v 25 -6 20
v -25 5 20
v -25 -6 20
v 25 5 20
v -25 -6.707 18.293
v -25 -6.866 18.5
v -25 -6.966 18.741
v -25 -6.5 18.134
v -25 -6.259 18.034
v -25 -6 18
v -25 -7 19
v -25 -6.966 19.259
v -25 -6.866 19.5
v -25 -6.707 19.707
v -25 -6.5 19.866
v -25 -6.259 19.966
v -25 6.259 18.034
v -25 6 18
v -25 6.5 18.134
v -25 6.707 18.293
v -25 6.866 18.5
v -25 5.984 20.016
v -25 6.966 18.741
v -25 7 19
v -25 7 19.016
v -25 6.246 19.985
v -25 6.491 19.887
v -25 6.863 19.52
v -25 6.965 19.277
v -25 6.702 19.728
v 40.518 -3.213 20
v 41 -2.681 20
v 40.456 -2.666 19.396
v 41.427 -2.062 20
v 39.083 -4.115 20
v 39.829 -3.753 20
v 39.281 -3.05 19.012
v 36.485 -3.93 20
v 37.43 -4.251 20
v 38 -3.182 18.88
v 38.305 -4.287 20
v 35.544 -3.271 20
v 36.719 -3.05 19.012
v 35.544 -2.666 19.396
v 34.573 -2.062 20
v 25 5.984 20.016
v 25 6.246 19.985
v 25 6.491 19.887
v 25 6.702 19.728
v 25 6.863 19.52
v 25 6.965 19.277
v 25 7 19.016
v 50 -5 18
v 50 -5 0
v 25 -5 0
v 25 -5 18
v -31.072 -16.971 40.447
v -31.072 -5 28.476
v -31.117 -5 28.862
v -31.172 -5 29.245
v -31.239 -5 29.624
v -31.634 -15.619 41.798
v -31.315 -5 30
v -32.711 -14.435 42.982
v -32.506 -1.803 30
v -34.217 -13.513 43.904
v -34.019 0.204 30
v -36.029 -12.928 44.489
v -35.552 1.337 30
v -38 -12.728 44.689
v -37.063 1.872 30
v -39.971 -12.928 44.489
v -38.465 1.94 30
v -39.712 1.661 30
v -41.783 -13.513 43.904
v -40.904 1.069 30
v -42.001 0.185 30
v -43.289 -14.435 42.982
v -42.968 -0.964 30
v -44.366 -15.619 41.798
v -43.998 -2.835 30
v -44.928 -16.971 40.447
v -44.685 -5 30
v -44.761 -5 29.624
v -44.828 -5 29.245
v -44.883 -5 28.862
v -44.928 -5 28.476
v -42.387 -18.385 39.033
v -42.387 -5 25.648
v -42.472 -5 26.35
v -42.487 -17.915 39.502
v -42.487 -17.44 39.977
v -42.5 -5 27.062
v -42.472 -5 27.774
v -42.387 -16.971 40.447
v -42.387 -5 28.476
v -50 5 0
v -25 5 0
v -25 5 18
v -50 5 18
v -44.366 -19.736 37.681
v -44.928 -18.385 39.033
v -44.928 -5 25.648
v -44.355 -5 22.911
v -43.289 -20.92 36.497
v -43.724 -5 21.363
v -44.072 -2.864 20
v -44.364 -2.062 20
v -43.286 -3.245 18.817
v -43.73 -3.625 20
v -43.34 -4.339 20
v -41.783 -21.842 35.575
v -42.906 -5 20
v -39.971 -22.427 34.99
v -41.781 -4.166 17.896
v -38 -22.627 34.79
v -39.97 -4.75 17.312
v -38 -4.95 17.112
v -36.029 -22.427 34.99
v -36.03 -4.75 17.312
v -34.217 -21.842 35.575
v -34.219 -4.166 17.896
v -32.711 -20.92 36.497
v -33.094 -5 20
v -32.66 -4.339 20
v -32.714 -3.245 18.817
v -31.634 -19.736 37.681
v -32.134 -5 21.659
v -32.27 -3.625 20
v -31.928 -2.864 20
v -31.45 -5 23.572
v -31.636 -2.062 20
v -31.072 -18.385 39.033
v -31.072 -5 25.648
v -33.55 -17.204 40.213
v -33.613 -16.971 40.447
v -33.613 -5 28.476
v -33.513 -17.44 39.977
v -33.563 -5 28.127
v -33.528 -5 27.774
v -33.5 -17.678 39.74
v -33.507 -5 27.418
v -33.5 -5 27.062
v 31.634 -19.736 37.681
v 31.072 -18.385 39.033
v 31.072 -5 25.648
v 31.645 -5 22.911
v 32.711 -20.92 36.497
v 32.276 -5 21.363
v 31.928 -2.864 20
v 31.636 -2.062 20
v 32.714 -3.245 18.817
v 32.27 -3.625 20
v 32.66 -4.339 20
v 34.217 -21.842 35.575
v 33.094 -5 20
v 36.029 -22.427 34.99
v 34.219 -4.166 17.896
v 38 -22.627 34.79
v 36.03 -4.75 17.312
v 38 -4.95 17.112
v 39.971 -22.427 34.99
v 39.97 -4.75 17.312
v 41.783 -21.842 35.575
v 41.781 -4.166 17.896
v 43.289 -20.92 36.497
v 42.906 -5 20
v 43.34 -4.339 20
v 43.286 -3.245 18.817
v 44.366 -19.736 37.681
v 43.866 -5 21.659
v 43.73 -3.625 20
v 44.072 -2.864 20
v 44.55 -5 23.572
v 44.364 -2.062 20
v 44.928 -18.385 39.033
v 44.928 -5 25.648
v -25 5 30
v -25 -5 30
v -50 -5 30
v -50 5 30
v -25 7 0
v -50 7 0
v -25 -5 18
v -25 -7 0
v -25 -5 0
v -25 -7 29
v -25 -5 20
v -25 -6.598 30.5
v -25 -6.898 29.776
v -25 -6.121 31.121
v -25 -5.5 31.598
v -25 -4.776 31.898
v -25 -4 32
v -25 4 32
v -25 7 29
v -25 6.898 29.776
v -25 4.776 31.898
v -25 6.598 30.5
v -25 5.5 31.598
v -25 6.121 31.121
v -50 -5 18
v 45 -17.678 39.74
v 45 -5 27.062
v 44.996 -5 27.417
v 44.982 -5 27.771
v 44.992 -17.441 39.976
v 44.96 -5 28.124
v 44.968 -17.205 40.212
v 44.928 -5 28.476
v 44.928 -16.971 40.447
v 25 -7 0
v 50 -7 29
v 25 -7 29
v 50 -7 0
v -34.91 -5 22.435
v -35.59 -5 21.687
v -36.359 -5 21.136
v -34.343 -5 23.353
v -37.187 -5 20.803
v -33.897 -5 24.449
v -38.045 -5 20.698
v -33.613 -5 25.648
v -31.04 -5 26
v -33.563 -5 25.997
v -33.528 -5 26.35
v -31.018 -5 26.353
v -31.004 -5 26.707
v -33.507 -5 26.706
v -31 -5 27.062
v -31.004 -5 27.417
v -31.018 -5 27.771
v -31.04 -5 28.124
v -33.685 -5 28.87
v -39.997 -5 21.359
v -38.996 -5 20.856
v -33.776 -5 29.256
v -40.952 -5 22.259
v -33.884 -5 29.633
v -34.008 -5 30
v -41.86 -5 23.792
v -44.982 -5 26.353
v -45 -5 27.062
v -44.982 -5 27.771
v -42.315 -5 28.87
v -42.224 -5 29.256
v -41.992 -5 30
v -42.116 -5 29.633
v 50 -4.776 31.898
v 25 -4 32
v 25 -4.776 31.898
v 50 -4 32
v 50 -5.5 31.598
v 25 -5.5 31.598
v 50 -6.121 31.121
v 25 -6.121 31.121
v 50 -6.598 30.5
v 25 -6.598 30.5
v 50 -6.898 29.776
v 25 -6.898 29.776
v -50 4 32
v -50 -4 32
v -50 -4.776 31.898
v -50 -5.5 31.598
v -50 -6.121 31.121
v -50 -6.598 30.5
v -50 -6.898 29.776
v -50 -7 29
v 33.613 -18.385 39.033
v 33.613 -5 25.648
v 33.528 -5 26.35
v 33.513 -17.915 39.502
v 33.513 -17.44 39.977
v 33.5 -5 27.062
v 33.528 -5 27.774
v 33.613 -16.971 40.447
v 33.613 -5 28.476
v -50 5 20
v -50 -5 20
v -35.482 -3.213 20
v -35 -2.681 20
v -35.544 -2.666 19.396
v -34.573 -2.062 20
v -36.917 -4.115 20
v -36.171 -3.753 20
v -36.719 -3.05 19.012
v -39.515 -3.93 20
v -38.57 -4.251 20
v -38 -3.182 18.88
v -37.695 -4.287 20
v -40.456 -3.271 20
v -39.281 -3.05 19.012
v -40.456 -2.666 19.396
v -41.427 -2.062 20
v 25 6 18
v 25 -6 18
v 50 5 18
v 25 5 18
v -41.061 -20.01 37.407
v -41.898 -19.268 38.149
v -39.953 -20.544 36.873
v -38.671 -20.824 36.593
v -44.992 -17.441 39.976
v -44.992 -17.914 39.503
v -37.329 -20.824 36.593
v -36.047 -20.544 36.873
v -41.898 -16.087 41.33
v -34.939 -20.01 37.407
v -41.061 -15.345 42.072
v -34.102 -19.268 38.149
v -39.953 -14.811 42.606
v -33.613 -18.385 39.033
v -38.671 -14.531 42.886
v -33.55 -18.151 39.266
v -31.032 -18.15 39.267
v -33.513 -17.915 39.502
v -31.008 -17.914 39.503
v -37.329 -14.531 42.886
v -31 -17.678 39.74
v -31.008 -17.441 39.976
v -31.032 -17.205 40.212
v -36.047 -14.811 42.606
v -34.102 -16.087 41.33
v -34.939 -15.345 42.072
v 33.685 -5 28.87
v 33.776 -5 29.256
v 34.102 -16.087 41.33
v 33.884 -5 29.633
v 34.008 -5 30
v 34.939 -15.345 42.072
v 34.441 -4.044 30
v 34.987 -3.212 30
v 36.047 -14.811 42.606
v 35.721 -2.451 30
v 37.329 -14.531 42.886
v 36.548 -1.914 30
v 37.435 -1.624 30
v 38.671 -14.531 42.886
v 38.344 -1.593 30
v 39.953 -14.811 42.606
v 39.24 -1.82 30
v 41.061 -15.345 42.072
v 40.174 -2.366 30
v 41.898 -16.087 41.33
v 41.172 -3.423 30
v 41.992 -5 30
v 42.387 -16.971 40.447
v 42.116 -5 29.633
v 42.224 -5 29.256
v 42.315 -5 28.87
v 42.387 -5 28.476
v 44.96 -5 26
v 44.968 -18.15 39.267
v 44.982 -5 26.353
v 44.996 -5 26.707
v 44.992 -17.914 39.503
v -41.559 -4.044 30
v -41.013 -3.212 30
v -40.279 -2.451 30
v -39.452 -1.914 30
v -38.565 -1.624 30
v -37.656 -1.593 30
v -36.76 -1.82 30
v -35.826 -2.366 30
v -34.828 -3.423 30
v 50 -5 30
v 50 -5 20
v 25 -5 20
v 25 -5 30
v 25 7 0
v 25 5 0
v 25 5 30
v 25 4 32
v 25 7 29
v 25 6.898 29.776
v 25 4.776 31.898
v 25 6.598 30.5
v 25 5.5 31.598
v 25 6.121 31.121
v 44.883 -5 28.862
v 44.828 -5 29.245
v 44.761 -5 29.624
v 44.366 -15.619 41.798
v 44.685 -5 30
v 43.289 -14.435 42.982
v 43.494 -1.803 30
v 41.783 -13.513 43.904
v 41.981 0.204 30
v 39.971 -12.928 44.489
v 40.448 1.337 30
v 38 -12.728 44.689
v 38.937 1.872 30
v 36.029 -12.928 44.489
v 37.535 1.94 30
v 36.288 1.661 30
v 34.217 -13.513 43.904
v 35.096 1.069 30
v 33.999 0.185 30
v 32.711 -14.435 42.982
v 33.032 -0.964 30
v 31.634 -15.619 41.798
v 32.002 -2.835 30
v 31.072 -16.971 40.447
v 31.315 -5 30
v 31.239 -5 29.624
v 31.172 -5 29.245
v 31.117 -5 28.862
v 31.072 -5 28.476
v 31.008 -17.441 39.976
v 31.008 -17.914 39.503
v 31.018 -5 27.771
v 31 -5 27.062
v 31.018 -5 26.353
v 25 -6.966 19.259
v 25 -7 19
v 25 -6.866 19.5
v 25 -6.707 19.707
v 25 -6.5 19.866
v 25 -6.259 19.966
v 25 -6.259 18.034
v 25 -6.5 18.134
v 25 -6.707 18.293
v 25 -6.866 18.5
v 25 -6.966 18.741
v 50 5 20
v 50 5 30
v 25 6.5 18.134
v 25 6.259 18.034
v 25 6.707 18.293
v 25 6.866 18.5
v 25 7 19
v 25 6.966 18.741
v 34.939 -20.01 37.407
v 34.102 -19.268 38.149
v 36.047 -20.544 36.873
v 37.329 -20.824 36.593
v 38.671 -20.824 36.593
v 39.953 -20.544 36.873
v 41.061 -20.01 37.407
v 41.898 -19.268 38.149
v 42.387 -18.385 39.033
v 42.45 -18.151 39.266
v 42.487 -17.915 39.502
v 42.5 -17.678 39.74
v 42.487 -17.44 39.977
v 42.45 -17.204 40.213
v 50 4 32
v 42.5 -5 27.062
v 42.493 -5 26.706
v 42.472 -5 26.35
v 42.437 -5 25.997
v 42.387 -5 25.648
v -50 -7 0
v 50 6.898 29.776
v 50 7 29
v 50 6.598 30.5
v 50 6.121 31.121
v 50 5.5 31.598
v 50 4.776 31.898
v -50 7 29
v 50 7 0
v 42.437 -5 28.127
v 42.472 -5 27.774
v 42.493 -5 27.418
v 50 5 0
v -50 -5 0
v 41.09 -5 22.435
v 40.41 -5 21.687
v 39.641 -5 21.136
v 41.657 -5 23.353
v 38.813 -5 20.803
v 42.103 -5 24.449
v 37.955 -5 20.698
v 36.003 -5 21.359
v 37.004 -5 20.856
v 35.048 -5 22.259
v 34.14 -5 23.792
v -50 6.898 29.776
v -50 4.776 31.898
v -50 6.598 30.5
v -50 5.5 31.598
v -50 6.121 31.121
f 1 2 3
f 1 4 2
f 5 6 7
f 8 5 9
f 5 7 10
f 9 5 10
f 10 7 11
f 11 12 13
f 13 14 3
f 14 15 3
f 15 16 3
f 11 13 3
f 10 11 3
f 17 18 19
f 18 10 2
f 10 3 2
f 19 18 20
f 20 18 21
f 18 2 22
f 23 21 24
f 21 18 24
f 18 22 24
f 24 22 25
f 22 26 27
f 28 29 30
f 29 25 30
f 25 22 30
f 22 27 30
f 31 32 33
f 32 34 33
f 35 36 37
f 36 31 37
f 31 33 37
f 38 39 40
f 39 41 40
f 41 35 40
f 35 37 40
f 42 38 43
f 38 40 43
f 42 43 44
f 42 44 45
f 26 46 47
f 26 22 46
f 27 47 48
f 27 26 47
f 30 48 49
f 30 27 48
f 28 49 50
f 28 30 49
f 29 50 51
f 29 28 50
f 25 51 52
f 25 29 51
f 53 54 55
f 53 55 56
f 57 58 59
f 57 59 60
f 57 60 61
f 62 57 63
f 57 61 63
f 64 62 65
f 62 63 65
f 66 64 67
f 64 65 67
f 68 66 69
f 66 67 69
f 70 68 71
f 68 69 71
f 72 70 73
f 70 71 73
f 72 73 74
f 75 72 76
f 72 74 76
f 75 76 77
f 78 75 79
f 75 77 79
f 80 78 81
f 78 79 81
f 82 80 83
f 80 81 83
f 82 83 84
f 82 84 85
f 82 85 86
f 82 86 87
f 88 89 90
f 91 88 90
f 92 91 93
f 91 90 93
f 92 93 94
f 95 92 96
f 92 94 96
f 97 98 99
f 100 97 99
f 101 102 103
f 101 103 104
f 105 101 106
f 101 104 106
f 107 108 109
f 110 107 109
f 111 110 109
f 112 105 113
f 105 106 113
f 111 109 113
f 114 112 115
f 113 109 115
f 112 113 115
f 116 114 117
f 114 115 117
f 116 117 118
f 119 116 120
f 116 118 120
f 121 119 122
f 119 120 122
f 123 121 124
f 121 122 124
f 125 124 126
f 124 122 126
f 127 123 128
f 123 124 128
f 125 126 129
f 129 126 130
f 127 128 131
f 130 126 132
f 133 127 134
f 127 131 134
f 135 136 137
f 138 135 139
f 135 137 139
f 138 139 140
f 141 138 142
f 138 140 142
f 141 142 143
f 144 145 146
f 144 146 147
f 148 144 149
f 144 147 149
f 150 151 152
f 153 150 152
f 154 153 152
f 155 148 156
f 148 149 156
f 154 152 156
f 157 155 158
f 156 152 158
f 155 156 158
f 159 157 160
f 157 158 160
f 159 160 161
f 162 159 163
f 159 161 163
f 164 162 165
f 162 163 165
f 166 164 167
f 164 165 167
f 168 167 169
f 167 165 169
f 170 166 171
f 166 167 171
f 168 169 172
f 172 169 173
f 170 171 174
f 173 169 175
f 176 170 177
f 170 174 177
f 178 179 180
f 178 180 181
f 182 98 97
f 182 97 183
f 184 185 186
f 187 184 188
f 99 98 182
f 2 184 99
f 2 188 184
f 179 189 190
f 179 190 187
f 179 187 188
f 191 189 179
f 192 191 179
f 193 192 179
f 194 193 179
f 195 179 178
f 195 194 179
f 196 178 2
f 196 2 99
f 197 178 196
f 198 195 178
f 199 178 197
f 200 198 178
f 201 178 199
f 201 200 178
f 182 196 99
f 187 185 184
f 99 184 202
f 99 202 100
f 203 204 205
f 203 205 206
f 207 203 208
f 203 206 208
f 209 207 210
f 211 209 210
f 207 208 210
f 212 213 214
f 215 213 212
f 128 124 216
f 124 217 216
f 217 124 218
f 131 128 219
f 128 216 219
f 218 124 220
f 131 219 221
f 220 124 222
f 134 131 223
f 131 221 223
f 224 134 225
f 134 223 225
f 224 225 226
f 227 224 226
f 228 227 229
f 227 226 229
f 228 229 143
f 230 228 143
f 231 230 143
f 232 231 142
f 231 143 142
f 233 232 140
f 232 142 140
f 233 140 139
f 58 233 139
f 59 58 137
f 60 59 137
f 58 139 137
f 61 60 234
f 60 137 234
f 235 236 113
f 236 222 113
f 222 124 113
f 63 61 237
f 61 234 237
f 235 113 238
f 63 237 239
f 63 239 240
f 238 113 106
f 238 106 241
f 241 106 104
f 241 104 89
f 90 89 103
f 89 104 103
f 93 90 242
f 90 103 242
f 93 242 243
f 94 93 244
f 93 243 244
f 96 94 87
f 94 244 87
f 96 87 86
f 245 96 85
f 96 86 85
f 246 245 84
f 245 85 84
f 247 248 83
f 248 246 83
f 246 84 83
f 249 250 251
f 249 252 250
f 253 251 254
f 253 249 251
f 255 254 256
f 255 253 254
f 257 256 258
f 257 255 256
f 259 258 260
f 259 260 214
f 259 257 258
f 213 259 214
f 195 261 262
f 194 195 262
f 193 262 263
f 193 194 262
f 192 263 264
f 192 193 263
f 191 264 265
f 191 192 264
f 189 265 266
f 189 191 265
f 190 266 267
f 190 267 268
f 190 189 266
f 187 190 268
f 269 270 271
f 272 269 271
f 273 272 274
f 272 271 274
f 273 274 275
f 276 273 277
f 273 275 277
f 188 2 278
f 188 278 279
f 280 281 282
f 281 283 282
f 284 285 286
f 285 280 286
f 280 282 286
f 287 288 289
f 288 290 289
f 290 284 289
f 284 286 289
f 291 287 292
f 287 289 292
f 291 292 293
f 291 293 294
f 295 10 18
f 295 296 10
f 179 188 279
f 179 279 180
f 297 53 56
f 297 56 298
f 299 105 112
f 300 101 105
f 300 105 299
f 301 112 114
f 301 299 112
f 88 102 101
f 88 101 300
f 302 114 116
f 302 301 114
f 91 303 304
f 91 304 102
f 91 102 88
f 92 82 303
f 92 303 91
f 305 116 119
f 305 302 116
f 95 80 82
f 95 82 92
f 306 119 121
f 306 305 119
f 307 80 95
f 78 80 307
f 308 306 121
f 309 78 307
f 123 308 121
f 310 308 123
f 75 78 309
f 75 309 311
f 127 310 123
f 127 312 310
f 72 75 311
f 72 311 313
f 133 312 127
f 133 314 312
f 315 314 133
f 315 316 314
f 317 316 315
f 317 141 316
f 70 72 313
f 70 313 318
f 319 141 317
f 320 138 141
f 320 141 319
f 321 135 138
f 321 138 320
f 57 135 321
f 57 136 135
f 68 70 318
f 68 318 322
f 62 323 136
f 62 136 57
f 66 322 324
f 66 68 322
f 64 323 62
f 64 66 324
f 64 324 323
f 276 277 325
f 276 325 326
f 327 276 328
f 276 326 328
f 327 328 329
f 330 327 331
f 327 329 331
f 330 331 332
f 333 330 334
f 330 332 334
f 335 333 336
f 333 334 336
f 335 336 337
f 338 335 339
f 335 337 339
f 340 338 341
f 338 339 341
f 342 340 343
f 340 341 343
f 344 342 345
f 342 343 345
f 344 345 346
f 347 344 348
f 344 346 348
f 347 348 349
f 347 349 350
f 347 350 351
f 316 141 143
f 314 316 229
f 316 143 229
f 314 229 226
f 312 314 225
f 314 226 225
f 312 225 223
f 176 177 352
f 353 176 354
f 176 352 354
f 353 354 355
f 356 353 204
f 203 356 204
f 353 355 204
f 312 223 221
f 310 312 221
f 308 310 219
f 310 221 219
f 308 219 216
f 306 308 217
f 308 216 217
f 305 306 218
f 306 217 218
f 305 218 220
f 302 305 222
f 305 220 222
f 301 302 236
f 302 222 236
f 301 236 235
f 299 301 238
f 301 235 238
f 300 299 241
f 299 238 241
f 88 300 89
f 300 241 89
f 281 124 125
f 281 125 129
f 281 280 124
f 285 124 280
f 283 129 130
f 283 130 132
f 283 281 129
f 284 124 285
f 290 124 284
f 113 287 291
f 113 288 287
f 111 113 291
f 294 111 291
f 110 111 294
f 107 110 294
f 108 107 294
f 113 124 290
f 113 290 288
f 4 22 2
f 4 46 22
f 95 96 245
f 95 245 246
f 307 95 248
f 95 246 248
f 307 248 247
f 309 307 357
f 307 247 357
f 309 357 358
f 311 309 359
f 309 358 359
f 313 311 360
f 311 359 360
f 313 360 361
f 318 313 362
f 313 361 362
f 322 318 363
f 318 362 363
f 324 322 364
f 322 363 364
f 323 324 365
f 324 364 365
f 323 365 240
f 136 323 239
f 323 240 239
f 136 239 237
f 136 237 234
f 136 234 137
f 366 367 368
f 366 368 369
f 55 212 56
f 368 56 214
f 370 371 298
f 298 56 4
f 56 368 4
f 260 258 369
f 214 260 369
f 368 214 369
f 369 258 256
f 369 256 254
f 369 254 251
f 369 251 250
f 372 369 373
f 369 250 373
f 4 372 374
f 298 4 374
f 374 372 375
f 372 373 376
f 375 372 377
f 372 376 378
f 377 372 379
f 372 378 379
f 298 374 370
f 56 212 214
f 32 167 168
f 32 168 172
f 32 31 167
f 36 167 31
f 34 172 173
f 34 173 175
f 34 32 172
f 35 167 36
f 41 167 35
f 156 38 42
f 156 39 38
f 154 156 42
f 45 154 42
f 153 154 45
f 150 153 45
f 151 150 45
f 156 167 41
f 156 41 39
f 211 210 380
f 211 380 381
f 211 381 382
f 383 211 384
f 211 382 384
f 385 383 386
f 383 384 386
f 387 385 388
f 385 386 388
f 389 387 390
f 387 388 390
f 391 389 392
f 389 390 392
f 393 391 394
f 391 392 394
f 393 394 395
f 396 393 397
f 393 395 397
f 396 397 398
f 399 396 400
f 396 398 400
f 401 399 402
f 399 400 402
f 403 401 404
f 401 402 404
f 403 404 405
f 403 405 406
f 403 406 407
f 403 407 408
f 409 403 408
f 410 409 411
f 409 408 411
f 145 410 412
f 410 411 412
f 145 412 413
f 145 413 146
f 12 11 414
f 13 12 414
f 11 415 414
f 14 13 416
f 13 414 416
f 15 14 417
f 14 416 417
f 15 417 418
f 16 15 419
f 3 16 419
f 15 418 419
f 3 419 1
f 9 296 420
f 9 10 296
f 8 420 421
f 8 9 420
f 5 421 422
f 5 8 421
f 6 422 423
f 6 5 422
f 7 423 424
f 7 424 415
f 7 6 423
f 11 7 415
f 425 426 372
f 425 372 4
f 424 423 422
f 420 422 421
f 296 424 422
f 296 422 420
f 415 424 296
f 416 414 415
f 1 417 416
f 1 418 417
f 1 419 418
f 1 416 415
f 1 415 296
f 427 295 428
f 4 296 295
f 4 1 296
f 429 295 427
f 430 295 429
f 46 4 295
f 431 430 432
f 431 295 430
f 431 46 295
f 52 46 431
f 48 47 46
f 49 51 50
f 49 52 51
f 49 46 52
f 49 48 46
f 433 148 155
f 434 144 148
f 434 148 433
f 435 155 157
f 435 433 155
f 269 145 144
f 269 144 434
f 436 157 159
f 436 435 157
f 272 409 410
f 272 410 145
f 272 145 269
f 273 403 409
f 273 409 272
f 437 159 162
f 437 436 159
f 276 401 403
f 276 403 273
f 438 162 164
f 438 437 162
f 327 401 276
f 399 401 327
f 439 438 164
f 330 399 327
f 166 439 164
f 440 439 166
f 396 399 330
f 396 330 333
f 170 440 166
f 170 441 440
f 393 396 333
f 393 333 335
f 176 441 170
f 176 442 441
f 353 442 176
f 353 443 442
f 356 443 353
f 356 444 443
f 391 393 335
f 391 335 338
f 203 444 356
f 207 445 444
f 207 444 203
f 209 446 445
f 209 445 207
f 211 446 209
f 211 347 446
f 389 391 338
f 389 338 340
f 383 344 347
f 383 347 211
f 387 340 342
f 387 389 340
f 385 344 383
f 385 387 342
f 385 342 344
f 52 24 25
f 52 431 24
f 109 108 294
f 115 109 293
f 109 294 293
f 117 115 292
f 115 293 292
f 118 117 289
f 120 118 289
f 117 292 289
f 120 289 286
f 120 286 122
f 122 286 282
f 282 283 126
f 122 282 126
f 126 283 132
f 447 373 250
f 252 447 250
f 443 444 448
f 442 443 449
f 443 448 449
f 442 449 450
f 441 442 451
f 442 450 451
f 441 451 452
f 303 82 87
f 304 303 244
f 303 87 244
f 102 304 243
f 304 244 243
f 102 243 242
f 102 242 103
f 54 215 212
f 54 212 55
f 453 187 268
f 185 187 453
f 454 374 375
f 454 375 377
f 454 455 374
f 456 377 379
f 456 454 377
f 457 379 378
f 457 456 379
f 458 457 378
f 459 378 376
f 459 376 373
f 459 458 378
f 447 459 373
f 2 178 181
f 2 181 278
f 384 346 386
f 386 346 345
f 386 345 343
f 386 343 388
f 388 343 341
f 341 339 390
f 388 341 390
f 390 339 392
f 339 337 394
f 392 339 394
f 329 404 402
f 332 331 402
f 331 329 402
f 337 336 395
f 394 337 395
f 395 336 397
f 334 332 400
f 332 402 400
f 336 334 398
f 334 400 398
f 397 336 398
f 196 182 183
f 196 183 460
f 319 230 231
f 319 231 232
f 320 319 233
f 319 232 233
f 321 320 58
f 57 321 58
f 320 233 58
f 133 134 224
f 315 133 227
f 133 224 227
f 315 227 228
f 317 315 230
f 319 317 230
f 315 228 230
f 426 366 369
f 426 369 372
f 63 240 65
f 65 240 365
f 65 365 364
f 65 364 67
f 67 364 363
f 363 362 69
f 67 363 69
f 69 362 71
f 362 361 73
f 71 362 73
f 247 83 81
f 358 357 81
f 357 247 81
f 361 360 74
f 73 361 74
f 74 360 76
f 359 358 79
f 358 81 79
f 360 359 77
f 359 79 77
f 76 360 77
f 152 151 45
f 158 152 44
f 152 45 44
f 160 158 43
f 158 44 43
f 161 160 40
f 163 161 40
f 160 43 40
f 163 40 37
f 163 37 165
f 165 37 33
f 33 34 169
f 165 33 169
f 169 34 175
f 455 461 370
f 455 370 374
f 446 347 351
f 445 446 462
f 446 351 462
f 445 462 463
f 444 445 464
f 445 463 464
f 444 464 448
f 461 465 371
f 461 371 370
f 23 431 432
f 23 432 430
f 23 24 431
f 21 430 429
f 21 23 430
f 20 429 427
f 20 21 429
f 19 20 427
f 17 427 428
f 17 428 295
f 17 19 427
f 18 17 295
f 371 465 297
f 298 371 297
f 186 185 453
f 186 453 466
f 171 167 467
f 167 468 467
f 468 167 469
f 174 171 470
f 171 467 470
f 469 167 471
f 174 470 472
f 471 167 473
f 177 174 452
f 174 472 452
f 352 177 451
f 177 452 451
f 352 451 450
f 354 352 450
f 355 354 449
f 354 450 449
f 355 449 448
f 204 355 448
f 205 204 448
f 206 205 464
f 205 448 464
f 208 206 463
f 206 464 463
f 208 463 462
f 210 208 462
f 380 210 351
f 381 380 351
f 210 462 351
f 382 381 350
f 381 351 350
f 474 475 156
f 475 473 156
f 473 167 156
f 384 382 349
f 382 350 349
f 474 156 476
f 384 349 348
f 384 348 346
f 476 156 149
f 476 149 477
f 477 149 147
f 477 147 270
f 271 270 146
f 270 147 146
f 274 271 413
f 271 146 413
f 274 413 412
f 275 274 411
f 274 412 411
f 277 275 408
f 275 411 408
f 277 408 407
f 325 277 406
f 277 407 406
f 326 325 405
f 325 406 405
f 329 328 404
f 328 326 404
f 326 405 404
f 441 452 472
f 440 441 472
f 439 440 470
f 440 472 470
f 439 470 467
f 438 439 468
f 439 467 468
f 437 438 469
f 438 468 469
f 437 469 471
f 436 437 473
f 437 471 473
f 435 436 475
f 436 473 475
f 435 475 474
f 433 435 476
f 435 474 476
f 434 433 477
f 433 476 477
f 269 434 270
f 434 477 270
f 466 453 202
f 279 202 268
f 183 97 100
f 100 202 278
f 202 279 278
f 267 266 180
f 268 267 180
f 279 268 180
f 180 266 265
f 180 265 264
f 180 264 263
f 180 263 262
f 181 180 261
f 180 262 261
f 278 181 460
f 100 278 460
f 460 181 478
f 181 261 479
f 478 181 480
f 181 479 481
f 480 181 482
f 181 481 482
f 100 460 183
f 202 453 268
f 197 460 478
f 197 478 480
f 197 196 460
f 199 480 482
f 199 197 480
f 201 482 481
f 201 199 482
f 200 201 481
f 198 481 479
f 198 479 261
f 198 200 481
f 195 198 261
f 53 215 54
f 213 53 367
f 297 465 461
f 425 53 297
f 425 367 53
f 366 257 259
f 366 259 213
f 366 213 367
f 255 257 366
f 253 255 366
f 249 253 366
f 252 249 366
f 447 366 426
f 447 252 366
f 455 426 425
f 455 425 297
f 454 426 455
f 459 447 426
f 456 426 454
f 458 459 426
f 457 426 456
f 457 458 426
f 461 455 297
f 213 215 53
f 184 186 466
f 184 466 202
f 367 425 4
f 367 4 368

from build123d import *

# Parameters (mm, degrees)
F1_DEPTH      = 25
F2_ANGLE      = 45
F3_W          = 2
F3_H          = 18
F4_DEPTH      = 50
F4_DEPTH_BACK = 50
F5_DEPTH      = 25
F5_DEPTH_BACK = 25
F6_DEPTH      = 25
F6_DEPTH_BACK = 25
F3_W_2        = 10
F3_H_2        = 10
F7_DEPTH      = 50
F7_DEPTH_BACK = 50
F8_R          = 3
F9_R          = 0.99999


# Not quite as in the source:
# - a fillet or chamfer is up to 0.001 mm smaller than in the source, because OpenCascade refuses the exact size


with BuildPart() as f1:
    # F0 (on Front) → F1 (new body)
    with BuildSketch(Plane.XZ):
        with BuildLine():
            Line((-33.6125178063, 23.0619773716), (-31.0717967697, 23.0619773716))
            ThreePointArc((-31.0717967697, 23.0619773716), (-38, 29.0619773716), (-44.9282032303, 23.0619773716))
            Line((-44.9282032303, 23.0619773716), (-42.3874821937, 23.0619773716))
            ThreePointArc((-42.3874821937, 23.0619773716), (-38, 26.5619773716), (-33.6125178063, 23.0619773716))
        make_face()
        with BuildLine():
            Line((-42.3874821937, 23.0619773716), (-44.9282032303, 23.0619773716))
            ThreePointArc((-44.9282032303, 23.0619773716), (-45, 22.0619773716), (-44.9282032303, 21.0619773716))
            Line((-44.9282032303, 21.0619773716), (-42.3874821937, 21.0619773716))
            ThreePointArc((-42.3874821937, 21.0619773716), (-42.5, 22.0619773716), (-42.3874821937, 23.0619773716))
        make_face()
        with BuildLine():
            ThreePointArc((-44.9282032303, 21.0619773716), (-38, 15.0619773716), (-31.0717967697, 21.0619773716))
            Line((-31.0717967697, 21.0619773716), (-33.6125178063, 21.0619773716))
            ThreePointArc((-33.6125178063, 21.0619773716), (-38, 17.5619773716), (-42.3874821937, 21.0619773716))
            Line((-42.3874821937, 21.0619773716), (-44.9282032303, 21.0619773716))
        make_face()
        with BuildLine():
            ThreePointArc((-31.0717967697, 21.0619773716), (-31.017972264, 21.560690334), (-31, 22.0619773716))
            ThreePointArc((-31, 22.0619773716), (-31.017972264, 22.5632644091), (-31.0717967697, 23.0619773716))
            Line((-31.0717967697, 23.0619773716), (-33.6125178063, 23.0619773716))
            ThreePointArc((-33.6125178063, 23.0619773716), (-33.5282179239, 22.565132481), (-33.5, 22.0619773716))
            ThreePointArc((-33.5, 22.0619773716), (-33.5282179239, 21.5588222621), (-33.6125178063, 21.0619773716))
            Line((-33.6125178063, 21.0619773716), (-31.0717967697, 21.0619773716))
        make_face()
    extrude(amount=F1_DEPTH)


with BuildPart() as f1b:
    # F0 (on Front) → F1, piece 2 (new body)
    with BuildSketch(Plane.XZ):
        with BuildLine():
            ThreePointArc((44.9282032303, 23.0619773716), (38, 29.0619773716), (31.0717967697, 23.0619773716))
            Line((31.0717967697, 23.0619773716), (33.6125178063, 23.0619773716))
            ThreePointArc((33.6125178063, 23.0619773716), (38, 26.5619773716), (42.3874821937, 23.0619773716))
            Line((42.3874821937, 23.0619773716), (44.9282032303, 23.0619773716))
        make_face()
        with BuildLine():
            Line((33.6125178063, 23.0619773716), (31.0717967697, 23.0619773716))
            ThreePointArc((31.0717967697, 23.0619773716), (31, 22.0619773716), (31.0717967697, 21.0619773716))
            Line((31.0717967697, 21.0619773716), (33.6125178063, 21.0619773716))
            ThreePointArc((33.6125178063, 21.0619773716), (33.5, 22.0619773716), (33.6125178063, 23.0619773716))
        make_face()
        with BuildLine():
            Line((33.6125178063, 21.0619773716), (31.0717967697, 21.0619773716))
            ThreePointArc((31.0717967697, 21.0619773716), (38, 15.0619773716), (44.9282032303, 21.0619773716))
            Line((44.9282032303, 21.0619773716), (42.3874821937, 21.0619773716))
            ThreePointArc((42.3874821937, 21.0619773716), (38, 17.5619773716), (33.6125178063, 21.0619773716))
        make_face()
        with BuildLine():
            ThreePointArc((45, 22.0619773716), (44.982027736, 22.5632644091), (44.9282032303, 23.0619773716))
            Line((44.9282032303, 23.0619773716), (42.3874821937, 23.0619773716))
            ThreePointArc((42.3874821937, 23.0619773716), (42.4717820761, 22.565132481), (42.5, 22.0619773716))
            ThreePointArc((42.5, 22.0619773716), (42.4717820761, 21.5588222621), (42.3874821937, 21.0619773716))
            Line((42.3874821937, 21.0619773716), (44.9282032303, 21.0619773716))
            ThreePointArc((44.9282032303, 21.0619773716), (44.982027736, 21.560690334), (45, 22.0619773716))
        make_face()
    extrude(amount=F1_DEPTH)


with BuildPart() as f1_1:
    # F2: moved
    add(f1.part.rotate(Axis((25, 0, 22.0619773716), (-1, 0, 0)), F2_ANGLE))


with BuildPart() as f1b_1:
    # F2: moved
    add(f1b.part.rotate(Axis((25, 0, 22.0619773716), (-1, 0, 0)), F2_ANGLE))


with BuildPart() as f4:
    # F3 (on Right) → F4 (new body, two sides)
    with BuildSketch(Plane.YZ) as f4_sk:
        Polygon((7, 20.0315864533), (5, 20), (-5, 20), (-7, 20), (-7, 18), (-5, 18), (5, 18), (7, 18), align=None)
        Polygon((5, 30), (5, 20), (7, 20.0315864533), (7, 32), (-7, 32), (-7, 20), (-5, 20), (-5, 30), align=None)
        with Locations((6, 9)):
            Rectangle(F3_W, F3_H)
        with Locations((-6, 9)):
            Rectangle(F3_W, F3_H)
    extrude(amount=F4_DEPTH)
    extrude(f4_sk.sketch, amount=-F4_DEPTH_BACK)

    # F3 (on Right) → F5 (cut, two sides)
    with BuildSketch(Plane.YZ) as f5_sk:
        Polygon((7, 20.0315864533), (5, 20), (-5, 20), (-7, 20), (-7, 18), (-5, 18), (5, 18), (7, 18), align=None)
        Polygon((5, 30), (5, 20), (7, 20.0315864533), (7, 32), (-7, 32), (-7, 20), (-5, 20), (-5, 30), align=None)
        with Locations((6, 9)):
            Rectangle(F3_W, F3_H)
        with Locations((-6, 9)):
            Rectangle(F3_W, F3_H)
    extrude(amount=-F5_DEPTH, mode=Mode.SUBTRACT)
    extrude(f5_sk.sketch, amount=F5_DEPTH_BACK, mode=Mode.SUBTRACT)

    # F8
    f8_edges = [f4.edges().sort_by_distance(p)[0] for p in [
        (37.5, 7, 32),
        (-37.5, 7, 32),
        (37.5, -7, 32),
        (-37.5, -7, 32),
    ]]
    fillet(f8_edges, radius=F8_R)


with BuildPart() as f6:
    # F3 (on Right) → F6 (new body, two sides)
    with BuildSketch(Plane.YZ) as f6_sk:
        Polygon((7, 20.0315864533), (5, 20), (-5, 20), (-7, 20), (-7, 18), (-5, 18), (5, 18), (7, 18), align=None)
    extrude(amount=F6_DEPTH)
    extrude(f6_sk.sketch, amount=-F6_DEPTH_BACK)

    # F9 (radius 1 in the source; OpenCascade refuses exactly that, so slightly less here)
    f9_edges = [f6.edges().sort_by_distance(p)[0] for p in [
        (0, -7, 20),
        (0, -7, 18),
        (0, 7, 20.031586),
        (0, 7, 18),
    ]]
    fillet(f9_edges, radius=F9_R)


with BuildPart() as f7_tool:
    # F3 (on Right) → F7 (new body, two sides)
    with BuildSketch(Plane.YZ) as f7_sk:
        with Locations((0, 25)):
            Rectangle(F3_W_2, F3_H_2)
    extrude(amount=-F7_DEPTH)
    extrude(f7_sk.sketch, amount=F7_DEPTH_BACK)


with BuildPart() as f1_2:
    add(f1_1.part)

    # F7: cut by f7_tool
    add(f7_tool.part, mode=Mode.SUBTRACT)


with BuildPart() as f1b_2:
    add(f1b_1.part)

    # F7: cut by f7_tool
    add(f7_tool.part, mode=Mode.SUBTRACT)


solid = Compound([f4.part, f6.part, f1_2.part, f1b_2.part])
